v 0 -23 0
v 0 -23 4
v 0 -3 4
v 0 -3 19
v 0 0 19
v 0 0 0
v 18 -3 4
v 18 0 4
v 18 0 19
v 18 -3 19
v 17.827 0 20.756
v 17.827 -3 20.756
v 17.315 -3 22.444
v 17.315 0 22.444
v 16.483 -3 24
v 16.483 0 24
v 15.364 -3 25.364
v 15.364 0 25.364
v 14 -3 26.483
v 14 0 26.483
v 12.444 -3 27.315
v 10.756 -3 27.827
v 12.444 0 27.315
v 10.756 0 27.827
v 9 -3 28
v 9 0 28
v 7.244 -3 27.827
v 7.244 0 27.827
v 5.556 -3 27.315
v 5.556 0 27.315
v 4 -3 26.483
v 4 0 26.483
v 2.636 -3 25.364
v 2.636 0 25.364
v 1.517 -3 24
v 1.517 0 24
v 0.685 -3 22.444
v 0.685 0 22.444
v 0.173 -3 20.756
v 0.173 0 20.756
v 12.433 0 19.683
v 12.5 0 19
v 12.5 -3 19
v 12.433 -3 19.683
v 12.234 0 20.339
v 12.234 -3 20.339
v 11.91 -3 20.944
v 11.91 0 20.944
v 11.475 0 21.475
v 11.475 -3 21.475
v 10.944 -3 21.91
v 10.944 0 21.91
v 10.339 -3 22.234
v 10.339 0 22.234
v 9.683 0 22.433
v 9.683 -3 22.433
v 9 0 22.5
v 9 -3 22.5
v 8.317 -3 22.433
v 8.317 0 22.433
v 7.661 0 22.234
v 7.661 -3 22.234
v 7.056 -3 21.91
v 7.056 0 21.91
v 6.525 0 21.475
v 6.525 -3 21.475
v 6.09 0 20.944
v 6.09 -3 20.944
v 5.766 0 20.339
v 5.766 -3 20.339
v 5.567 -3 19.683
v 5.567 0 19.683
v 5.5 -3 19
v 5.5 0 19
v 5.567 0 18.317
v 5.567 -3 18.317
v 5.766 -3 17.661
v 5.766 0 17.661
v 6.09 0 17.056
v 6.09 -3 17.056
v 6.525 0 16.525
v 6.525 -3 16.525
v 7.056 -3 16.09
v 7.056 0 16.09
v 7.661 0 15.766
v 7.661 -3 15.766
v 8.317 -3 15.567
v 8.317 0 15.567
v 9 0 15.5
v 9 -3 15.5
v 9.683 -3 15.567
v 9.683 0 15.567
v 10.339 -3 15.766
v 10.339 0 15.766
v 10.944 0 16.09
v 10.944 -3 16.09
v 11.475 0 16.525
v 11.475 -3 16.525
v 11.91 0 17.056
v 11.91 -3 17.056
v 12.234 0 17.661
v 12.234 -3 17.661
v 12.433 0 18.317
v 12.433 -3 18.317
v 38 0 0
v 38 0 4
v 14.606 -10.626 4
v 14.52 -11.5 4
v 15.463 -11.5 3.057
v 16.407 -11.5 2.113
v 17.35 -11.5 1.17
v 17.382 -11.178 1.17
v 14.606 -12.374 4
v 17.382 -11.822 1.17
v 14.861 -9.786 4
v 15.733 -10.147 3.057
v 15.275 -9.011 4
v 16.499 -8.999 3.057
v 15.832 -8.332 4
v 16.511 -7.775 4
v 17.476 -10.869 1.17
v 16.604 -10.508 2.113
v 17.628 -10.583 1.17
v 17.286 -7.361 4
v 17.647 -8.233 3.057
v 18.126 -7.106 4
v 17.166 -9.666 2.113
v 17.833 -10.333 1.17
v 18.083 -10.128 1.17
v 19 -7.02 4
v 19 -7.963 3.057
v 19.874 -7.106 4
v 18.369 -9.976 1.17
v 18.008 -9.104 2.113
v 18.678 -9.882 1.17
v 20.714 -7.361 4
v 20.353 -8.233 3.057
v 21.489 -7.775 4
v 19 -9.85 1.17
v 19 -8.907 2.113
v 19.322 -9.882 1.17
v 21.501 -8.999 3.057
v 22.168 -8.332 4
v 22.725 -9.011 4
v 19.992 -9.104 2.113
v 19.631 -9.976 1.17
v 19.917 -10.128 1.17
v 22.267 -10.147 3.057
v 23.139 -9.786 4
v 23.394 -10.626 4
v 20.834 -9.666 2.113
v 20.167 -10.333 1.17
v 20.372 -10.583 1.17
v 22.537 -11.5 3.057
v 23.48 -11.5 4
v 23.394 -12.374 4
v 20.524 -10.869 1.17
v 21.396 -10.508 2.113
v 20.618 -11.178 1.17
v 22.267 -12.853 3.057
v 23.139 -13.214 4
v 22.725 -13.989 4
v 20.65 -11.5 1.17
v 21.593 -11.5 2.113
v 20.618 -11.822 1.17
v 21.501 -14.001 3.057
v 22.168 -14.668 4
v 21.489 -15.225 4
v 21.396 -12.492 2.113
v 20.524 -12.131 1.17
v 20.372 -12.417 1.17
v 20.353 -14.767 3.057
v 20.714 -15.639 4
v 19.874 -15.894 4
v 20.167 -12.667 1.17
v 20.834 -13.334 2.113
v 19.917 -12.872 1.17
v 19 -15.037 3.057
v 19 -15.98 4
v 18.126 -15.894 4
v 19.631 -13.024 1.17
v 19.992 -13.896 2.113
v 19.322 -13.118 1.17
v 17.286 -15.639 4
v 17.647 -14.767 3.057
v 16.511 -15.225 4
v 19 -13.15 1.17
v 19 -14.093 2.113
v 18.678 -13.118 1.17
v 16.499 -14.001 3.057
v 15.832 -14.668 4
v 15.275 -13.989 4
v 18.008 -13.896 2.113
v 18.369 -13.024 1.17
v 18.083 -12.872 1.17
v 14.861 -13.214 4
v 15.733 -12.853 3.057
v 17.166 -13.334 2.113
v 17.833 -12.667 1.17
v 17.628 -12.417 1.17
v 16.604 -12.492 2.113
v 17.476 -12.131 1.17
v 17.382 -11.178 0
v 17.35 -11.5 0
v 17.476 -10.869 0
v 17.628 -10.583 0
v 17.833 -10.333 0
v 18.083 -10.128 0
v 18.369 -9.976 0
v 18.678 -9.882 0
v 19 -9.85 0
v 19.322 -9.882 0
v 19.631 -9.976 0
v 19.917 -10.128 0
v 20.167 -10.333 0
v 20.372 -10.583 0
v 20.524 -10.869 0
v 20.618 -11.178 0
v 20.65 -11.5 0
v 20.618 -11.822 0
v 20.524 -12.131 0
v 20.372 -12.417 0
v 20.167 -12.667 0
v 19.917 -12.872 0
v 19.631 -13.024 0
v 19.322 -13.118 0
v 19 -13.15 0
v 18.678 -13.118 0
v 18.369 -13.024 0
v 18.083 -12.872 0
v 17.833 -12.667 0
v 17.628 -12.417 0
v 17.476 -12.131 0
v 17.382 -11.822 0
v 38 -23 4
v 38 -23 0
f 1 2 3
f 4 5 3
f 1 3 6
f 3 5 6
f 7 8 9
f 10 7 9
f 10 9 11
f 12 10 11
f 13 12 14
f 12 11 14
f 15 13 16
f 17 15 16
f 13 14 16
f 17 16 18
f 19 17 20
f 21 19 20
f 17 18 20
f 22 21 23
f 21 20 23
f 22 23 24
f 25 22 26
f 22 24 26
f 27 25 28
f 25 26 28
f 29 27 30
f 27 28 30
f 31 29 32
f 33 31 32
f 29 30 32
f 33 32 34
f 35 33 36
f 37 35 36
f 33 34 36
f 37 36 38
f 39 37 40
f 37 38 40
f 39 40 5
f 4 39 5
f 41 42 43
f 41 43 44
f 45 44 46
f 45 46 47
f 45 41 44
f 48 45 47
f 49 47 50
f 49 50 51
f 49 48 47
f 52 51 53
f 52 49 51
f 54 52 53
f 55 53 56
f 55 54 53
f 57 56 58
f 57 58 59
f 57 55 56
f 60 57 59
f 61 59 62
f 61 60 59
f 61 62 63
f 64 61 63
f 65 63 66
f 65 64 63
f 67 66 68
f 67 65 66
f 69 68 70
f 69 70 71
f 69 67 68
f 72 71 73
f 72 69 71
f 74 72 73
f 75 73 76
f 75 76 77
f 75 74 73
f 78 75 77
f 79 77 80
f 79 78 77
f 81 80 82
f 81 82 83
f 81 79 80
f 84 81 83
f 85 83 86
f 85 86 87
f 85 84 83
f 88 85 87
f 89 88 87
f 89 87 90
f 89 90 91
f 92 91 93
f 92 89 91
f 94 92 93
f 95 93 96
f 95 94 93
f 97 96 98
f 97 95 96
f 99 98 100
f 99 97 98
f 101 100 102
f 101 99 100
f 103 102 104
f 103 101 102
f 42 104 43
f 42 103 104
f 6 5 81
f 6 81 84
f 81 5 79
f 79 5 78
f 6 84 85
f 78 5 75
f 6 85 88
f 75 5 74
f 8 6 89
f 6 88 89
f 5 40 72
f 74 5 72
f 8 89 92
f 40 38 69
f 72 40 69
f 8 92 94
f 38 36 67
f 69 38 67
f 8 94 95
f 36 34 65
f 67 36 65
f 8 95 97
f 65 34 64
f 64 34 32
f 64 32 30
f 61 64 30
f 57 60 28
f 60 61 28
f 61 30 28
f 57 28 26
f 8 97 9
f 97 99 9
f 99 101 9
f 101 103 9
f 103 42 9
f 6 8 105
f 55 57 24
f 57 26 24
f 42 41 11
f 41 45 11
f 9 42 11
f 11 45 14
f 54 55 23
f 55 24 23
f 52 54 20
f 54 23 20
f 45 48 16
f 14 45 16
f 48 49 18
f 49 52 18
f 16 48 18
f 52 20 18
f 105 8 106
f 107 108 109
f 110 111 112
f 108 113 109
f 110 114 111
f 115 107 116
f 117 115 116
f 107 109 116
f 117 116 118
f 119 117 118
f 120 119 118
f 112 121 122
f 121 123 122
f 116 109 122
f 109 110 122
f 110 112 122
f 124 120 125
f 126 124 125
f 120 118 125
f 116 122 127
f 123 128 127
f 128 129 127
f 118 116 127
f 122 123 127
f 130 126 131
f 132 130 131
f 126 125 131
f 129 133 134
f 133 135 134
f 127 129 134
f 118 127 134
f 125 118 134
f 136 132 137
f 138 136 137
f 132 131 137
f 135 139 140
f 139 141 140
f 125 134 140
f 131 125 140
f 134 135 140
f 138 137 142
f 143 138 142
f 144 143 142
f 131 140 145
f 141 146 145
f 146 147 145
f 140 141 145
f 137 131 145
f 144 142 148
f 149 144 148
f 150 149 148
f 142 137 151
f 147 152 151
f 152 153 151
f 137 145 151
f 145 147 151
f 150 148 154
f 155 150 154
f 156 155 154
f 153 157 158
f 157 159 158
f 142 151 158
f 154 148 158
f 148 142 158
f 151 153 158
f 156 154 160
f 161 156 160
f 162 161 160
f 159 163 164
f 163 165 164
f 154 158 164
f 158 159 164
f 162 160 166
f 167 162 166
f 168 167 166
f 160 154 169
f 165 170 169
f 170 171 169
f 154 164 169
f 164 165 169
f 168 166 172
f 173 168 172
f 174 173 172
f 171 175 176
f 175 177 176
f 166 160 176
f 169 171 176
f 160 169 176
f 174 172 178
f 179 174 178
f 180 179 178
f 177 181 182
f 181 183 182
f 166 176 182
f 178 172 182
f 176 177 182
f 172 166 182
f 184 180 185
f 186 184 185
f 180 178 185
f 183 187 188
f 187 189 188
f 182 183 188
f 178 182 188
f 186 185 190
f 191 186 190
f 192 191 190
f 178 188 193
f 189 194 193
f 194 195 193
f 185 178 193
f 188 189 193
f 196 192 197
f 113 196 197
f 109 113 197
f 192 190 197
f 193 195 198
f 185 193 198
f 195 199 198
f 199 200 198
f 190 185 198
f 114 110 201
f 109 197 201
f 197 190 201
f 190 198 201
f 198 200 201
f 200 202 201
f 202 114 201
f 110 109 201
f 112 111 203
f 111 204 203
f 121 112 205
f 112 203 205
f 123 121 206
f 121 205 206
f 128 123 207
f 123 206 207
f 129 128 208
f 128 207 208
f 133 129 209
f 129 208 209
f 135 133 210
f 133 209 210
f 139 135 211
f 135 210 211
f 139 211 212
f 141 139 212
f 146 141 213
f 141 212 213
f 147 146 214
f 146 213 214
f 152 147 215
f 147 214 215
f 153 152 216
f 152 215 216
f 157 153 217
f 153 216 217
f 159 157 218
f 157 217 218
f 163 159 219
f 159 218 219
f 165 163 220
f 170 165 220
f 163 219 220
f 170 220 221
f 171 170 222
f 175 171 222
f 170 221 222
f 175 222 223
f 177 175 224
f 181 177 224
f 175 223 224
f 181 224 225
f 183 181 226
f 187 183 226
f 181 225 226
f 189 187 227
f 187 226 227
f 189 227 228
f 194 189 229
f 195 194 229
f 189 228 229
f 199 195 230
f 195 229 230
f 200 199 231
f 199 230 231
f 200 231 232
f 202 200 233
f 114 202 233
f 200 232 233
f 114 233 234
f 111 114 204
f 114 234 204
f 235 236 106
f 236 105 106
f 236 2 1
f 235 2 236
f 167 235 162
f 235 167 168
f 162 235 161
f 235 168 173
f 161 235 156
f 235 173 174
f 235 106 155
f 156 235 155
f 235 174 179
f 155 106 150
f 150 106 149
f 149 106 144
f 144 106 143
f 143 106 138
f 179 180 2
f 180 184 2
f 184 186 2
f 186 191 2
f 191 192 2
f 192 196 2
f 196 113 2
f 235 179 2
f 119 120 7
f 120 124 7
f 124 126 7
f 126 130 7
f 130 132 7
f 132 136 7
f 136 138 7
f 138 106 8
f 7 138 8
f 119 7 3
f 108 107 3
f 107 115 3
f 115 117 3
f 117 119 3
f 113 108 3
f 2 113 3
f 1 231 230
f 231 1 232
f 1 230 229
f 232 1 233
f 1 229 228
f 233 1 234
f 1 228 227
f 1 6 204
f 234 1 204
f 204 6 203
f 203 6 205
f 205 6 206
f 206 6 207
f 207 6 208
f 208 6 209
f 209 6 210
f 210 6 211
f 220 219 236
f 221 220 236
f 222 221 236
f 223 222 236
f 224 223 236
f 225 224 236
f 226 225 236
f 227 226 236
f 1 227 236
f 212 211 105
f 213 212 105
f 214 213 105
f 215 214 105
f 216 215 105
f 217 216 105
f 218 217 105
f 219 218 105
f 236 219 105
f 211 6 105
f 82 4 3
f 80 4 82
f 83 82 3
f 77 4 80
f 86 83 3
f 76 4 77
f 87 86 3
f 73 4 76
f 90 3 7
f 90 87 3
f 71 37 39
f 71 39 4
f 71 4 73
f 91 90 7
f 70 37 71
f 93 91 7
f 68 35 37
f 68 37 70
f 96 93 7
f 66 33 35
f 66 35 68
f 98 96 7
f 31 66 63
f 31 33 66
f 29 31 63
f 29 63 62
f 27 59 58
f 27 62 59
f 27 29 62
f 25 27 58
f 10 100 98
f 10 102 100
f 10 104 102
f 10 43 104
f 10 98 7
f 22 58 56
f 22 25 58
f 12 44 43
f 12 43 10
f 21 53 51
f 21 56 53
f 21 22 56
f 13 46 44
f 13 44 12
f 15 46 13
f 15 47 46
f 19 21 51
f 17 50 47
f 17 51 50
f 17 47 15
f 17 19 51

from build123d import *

# Parameters (mm, degrees)
F0_R           = 3.5
F1_DEPTH       = 3
F3_DEPTH       = 20
F5_D           = 3.3
F5_CSINK_D     = 8.96
F5_CSINK_ANGLE = 90


with BuildPart() as f1:
    # F0 (on Front) → F1 (new body)
    with BuildSketch(Plane.XZ):
        with BuildLine():
            Line((0, 19), (0, 0))
            Line((0, 0), (38, 0))
            Line((38, 0), (38, 4))
            Line((38, 4), (18, 4))
            Line((18, 4), (18, 19))
            ThreePointArc((18, 19), (9, 10), (0, 19))
        make_face()
        with BuildLine():
            ThreePointArc((18, 19), (9, 28), (0, 19))
            ThreePointArc((0, 19), (9, 10), (18, 19))
        make_face()
        with Locations((9, 19)):
            Circle(F0_R, mode=Mode.SUBTRACT)
    extrude(amount=F1_DEPTH)

    # F2 (on face) → F3 (join)
    with BuildSketch(Plane.XZ.offset(3)):
        Polygon((0, 0), (38, 0), (38, 4), (18, 4), (0, 4), align=None)
    extrude(amount=F3_DEPTH)

    # F5 (through all)
    with Locations(Plane.XY.offset(4)):
        with Locations((19, -11.5)):
            CounterSinkHole(F5_D / 2, F5_CSINK_D / 2, counter_sink_angle=F5_CSINK_ANGLE)


solid = f1.part
